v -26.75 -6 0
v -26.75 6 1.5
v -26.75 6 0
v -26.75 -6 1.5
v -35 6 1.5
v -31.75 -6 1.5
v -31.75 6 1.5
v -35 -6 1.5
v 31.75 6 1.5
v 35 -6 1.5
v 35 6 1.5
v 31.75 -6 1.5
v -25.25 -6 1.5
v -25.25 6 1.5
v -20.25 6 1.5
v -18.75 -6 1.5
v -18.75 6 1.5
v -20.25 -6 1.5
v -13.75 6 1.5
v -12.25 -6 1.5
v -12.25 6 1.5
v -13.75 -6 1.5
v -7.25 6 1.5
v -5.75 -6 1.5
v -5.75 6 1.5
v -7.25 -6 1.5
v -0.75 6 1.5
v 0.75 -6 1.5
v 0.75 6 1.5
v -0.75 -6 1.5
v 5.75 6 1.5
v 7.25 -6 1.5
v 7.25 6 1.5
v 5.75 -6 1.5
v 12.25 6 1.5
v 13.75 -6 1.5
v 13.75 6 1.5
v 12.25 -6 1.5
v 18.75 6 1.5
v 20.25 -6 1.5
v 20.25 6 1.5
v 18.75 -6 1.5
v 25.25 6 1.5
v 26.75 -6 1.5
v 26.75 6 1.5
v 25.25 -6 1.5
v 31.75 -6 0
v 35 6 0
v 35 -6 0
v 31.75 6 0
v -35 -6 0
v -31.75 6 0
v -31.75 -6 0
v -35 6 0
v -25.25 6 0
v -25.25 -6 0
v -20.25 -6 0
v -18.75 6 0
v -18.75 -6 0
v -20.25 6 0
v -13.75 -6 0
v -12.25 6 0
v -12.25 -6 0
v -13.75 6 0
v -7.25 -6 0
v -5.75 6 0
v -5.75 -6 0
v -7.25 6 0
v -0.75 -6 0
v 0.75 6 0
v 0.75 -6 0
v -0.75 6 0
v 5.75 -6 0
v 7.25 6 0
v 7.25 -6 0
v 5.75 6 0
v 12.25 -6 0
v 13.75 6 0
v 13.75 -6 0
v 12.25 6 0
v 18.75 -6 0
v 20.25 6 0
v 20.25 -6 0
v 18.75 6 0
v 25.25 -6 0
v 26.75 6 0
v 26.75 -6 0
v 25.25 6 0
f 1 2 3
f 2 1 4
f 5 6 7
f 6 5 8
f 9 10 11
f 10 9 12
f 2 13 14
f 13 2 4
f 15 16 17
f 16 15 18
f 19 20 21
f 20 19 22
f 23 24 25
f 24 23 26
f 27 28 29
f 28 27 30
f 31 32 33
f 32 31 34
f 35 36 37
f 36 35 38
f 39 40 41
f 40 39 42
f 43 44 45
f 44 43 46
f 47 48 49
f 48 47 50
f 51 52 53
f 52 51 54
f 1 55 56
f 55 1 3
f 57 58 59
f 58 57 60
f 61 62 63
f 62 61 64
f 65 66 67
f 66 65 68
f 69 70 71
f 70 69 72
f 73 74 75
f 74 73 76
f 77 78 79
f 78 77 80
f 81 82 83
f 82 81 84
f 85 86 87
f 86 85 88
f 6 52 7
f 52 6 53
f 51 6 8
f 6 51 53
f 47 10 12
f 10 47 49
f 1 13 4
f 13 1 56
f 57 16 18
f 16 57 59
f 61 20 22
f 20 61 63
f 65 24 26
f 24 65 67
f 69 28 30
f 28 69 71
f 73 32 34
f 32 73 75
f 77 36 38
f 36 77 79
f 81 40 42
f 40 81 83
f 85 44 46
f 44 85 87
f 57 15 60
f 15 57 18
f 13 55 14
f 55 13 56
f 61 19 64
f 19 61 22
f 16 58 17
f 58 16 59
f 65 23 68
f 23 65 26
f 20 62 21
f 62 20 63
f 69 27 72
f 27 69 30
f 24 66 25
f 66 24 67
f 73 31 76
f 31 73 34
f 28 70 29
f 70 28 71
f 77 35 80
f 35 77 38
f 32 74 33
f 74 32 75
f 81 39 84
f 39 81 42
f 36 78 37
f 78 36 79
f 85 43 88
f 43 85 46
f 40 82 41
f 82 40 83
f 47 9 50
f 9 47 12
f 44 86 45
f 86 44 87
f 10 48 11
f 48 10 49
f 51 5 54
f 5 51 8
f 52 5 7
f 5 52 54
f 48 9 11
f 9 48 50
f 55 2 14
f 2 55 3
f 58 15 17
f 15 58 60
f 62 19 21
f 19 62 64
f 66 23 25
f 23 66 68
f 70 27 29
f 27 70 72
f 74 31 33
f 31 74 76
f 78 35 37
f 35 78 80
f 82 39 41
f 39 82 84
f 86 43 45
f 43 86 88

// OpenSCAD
// 10-well agarose gel casting comb
// Print orientation: flat on bed, teeth pointing down (-Y)

$fn = 64;

// ---- Dimensions (mm) ----
plate_t      = 1.5;   // plate thickness (Z)
spine_l      = 70;    // spine length (X)
spine_w      = 12;    // spine width (Y)
tooth_w      = 5.0;   // tooth width (X)
tooth_l      = 12;    // tooth length (Y)
tooth_count  = 10;    // number of teeth
gap          = 1.5;   // gap between teeth (X)
eps          = 0.5;   // cutter overshoot past faces (Z)

// ---- Derived ----
pitch   = tooth_w + gap;            // centre-to-centre spacing of teeth
x_start = -(tooth_count - 1) * pitch / 2; // first tooth centre (row centred on spine)

// ---- Model ----
difference() {
    // Flat plate with spine and teeth in +Y
    union() {
        // Spine (back bar)
        translate([-spine_l / 2, -spine_w / 2, 0])
            cube([spine_l, spine_w, plate_t]);

        // Teeth hanging from the long edge of the spine
        for (i = [0 : tooth_count - 1])
            translate([x_start + i * pitch - tooth_w / 2,
                       spine_w / 2 - tooth_l,
                       0])
                cube([tooth_w, tooth_l + eps, plate_t]);
    }

    // Cut out the 10 wells seen from above
    for (i = [0 : tooth_count - 1])
        translate([x_start + i * pitch - tooth_w / 2,
                   spine_w / 2 - tooth_l,
                   -eps])
            cube([tooth_w, tooth_l + 2 * eps, plate_t + 2 * eps]);
}
